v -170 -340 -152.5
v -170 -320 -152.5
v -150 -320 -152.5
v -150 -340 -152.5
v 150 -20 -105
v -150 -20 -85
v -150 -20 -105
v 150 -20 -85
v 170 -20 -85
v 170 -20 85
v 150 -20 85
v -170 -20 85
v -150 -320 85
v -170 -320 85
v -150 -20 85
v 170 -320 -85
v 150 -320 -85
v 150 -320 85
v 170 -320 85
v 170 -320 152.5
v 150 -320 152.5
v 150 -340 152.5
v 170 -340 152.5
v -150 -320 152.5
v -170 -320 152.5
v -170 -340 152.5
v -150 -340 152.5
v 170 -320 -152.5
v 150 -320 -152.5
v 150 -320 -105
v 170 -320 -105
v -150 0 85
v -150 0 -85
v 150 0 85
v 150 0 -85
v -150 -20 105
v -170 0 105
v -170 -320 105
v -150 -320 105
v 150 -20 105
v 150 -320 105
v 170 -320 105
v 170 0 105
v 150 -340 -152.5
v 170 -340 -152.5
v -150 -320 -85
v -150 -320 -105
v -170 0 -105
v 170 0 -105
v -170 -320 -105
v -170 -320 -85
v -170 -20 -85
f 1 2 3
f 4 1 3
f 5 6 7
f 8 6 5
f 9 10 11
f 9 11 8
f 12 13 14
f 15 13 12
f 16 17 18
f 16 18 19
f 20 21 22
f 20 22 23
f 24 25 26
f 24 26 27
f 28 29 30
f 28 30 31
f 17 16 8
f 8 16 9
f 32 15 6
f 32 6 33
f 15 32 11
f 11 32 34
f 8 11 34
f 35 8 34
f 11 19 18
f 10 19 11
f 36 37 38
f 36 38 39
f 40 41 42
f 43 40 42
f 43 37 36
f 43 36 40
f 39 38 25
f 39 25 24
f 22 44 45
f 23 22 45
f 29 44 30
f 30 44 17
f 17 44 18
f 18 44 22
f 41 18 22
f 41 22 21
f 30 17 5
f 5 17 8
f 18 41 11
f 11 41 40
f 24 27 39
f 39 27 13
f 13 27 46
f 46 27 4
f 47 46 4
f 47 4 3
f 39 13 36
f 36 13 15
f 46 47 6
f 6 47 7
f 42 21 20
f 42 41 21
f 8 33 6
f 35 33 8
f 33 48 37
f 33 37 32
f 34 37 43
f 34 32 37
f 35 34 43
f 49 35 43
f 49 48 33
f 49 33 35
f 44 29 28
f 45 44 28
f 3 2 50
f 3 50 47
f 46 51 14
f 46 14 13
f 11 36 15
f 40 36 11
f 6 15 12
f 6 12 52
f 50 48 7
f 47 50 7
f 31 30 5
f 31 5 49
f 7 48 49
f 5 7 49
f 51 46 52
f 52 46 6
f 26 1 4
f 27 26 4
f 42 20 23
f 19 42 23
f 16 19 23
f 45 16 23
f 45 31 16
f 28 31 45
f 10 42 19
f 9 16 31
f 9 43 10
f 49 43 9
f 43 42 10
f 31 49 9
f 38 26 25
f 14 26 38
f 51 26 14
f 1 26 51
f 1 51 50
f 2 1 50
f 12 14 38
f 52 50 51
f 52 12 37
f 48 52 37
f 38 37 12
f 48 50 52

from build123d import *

# Parameters (mm, degrees)
SKETCH1_W                = 340
SKETCH1_H                = 210
BOSS_EXTRUDE1_DEPTH      = 320
SKETCH2_W                = 300
SKETCH2_H                = 170
CUT_EXTRUDE1_DEPTH       = 378.259857393
SKETCH3_W                = 300
SKETCH3_H                = 600
CUT_EXTRUDE2_DEPTH       = 419.807831827
SKETCH4_W                = 170
SKETCH4_H                = 600
CUT_EXTRUDE3_DEPTH       = 479.565564996
BOSS_EXTRUDE2_DEPTH      = 152.5
BOSS_EXTRUDE2_DEPTH_BACK = 152.5
SKETCH5_W                = 20
SKETCH5_H                = 20
SKETCH5_W_2              = 40
SKETCH6_W                = 20
SKETCH6_H                = 305
CUT_EXTRUDE4_DEPTH       = 403.189321091


with BuildPart() as part:
    # Sketch1 → Boss-Extrude1 (new body)
    with BuildSketch(Plane(origin=(0, 0, 0), x_dir=(1, 0, 0), z_dir=(0, 1, 0))):
        Rectangle(SKETCH1_W, SKETCH1_H)
    extrude(amount=-BOSS_EXTRUDE1_DEPTH)

    # Sketch2 → Cut-Extrude1 (cut, through all)
    with BuildSketch(Plane(origin=(0, 0, 0), x_dir=(1, 0, 0), z_dir=(0, 1, 0))):
        Rectangle(SKETCH2_W, SKETCH2_H)
    extrude(amount=-CUT_EXTRUDE1_DEPTH, mode=Mode.SUBTRACT)

    # Sketch3 → Cut-Extrude2 (cut, through all)
    with BuildSketch(Plane.XY.offset(105)):
        with Locations((0, -320)):
            Rectangle(SKETCH3_W, SKETCH3_H)
    extrude(amount=-CUT_EXTRUDE2_DEPTH, mode=Mode.SUBTRACT)

    # Sketch4 → Cut-Extrude3 (cut, through all)
    with BuildSketch(Plane(origin=(170, 0, 0), x_dir=(0, 0, -1), z_dir=(1, 0, 0))):
        with Locations((0, -320)):
            Rectangle(SKETCH4_W, SKETCH4_H)
    extrude(amount=-CUT_EXTRUDE3_DEPTH, mode=Mode.SUBTRACT)

    # Sketch5 → Boss-Extrude2 (add, two sides: drawn at the far end of the back side and taken through both)
    with BuildSketch(Plane.XY.offset(-BOSS_EXTRUDE2_DEPTH_BACK)):
        with Locations((-160, -330)):
            Rectangle(SKETCH5_W, SKETCH5_H)
        with Locations((170, -330)):
            Rectangle(SKETCH5_W_2, SKETCH5_H)
    extrude(amount=BOSS_EXTRUDE2_DEPTH + BOSS_EXTRUDE2_DEPTH_BACK)

    # Sketch6 → Cut-Extrude4 (cut, through all)
    with BuildSketch(Plane(origin=(0, -320, 0), x_dir=(1, 0, 0), z_dir=(0, 1, 0))):
        with Locations((180, 0)):
            Rectangle(SKETCH6_W, SKETCH6_H)
    extrude(amount=-CUT_EXTRUDE4_DEPTH, mode=Mode.SUBTRACT)


solid = part.part
